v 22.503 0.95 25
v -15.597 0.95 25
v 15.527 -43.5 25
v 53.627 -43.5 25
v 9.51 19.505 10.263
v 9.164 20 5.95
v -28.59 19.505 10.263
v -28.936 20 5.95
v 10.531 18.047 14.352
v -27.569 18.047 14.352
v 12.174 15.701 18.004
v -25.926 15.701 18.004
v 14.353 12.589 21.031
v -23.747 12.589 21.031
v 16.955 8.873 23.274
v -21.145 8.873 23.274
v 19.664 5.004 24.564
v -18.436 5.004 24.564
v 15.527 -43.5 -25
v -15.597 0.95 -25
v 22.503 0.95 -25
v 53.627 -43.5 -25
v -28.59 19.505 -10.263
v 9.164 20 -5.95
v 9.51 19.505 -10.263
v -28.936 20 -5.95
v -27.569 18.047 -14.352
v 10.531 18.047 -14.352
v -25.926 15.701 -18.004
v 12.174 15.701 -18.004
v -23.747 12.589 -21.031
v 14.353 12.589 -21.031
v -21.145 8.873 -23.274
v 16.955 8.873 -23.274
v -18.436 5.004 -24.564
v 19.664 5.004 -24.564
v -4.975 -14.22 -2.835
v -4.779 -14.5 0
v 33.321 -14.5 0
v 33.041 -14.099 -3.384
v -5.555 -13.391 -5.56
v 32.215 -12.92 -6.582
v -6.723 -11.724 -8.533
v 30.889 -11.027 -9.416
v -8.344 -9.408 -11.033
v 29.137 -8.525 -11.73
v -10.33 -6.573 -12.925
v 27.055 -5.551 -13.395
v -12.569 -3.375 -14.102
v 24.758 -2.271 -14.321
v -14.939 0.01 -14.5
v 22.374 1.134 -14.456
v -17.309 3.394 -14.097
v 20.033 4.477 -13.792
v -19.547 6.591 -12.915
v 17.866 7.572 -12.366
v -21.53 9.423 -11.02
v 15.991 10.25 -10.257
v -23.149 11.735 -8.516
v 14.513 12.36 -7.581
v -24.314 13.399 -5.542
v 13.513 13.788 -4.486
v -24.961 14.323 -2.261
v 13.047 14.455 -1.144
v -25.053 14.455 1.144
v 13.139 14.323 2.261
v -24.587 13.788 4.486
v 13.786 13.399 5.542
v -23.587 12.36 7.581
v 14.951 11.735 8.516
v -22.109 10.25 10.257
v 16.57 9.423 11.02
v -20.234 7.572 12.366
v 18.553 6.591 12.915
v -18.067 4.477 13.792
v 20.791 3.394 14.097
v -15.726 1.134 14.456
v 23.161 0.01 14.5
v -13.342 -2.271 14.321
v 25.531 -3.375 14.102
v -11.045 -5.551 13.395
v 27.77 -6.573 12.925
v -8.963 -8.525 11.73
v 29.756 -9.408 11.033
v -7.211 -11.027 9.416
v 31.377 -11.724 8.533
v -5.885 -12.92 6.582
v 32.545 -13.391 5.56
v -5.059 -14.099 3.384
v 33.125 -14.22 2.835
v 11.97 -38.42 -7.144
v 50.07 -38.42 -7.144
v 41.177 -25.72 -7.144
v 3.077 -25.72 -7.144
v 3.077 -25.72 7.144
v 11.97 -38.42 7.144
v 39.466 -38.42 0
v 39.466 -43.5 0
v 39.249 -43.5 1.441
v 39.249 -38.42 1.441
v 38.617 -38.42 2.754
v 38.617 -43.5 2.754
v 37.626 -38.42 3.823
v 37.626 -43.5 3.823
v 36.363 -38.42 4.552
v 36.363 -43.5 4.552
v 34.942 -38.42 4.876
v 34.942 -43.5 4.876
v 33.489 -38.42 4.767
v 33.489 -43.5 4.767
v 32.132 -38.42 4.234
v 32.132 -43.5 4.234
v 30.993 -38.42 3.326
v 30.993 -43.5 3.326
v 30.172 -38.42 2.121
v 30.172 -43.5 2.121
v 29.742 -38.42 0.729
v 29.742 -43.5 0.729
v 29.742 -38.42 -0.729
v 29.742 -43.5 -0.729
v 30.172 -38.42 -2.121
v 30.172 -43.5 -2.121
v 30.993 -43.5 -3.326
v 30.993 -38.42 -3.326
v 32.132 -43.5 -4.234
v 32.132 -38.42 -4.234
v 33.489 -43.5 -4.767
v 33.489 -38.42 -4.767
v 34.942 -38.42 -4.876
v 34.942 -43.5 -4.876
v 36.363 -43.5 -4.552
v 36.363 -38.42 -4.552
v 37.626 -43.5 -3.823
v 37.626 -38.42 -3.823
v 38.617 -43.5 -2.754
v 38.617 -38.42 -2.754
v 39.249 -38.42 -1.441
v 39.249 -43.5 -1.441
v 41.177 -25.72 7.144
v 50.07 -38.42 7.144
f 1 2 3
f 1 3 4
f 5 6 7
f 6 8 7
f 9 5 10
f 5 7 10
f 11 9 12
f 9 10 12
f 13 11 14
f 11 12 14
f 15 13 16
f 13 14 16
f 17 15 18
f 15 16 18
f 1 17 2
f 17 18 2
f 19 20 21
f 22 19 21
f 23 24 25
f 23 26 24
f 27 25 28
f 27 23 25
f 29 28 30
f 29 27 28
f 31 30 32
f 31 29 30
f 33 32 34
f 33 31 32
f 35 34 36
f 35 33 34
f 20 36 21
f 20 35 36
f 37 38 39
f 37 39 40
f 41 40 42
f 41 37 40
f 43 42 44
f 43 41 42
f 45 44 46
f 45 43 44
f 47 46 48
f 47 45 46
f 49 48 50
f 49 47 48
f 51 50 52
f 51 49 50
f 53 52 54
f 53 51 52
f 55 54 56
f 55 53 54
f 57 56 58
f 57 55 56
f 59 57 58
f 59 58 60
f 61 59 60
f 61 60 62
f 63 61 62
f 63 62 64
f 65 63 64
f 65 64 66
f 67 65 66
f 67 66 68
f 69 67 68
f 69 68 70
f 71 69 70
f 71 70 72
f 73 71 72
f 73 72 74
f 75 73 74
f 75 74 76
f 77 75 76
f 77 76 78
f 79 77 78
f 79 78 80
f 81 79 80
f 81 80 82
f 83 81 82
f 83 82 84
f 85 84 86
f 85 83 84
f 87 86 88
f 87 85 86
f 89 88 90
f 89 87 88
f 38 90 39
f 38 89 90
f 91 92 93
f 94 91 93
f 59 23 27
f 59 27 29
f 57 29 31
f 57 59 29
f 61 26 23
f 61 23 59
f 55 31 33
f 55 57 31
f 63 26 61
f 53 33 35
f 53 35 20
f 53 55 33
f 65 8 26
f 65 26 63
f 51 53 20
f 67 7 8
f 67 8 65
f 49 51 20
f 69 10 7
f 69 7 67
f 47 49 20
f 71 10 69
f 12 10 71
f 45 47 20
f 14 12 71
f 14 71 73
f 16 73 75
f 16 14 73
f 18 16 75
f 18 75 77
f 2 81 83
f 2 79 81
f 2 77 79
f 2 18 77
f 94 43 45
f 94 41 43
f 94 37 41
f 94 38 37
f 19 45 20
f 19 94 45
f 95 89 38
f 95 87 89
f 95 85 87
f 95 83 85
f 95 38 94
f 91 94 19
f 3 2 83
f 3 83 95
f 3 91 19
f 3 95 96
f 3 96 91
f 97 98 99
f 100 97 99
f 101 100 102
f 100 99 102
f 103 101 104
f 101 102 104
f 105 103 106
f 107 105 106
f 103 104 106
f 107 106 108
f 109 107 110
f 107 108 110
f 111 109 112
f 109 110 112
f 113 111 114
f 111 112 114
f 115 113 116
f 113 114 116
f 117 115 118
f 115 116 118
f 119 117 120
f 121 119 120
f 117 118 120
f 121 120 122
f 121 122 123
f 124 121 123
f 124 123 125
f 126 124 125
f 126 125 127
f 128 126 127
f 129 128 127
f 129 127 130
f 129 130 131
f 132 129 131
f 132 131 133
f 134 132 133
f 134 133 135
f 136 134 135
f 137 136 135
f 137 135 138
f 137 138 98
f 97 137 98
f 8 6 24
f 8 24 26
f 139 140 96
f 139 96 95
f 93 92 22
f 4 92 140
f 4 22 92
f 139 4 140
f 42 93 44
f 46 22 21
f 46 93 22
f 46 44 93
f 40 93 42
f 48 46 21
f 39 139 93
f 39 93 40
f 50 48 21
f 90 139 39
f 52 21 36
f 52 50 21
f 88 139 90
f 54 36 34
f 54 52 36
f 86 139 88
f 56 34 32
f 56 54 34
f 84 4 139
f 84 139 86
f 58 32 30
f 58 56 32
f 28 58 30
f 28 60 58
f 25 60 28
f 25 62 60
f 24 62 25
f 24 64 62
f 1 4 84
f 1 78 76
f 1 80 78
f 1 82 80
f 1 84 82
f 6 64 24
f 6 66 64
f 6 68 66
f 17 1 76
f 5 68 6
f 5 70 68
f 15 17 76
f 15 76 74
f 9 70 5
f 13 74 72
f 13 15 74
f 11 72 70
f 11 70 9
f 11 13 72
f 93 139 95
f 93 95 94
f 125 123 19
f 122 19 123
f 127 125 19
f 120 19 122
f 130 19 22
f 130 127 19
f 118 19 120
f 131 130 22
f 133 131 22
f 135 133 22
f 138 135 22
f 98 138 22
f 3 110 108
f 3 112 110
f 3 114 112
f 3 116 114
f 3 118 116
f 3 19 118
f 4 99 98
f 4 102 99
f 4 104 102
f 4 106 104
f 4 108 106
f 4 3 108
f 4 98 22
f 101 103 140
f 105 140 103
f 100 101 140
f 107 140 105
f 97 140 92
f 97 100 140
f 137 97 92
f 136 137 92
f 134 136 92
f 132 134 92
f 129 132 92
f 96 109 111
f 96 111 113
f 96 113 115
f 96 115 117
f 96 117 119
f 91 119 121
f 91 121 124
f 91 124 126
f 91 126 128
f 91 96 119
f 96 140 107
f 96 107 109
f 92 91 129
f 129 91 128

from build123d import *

# Parameters (mm, degrees)
BOSS_EXTRUDE1_DEPTH     = 25
FILLET1_R               = 19.05
CUT_EXTRUDE1_DEPTH      = 74.437759365
CUT_EXTRUDE1_DEPTH_BACK = 74.437759365
SKETCH3_R               = 14.5
SKETCH3_W               = 14.2875
SKETCH3_H               = 12.7
SKETCH5_R               = 4.8895
CUT_EXTRUDE2_DEPTH      = 12.7


with BuildPart() as part:
    # Sketch2 → Boss-Extrude1 (new, symmetric)
    with BuildSketch(Plane.XY):
        Polygon((-28.936184536, 20), (15.526994141, -43.5), (53.626994141, -43.5), (9.163815464, 20), align=None)
    extrude(amount=BOSS_EXTRUDE1_DEPTH, both=True)

    # Fillet1
    fillet1_edges = [part.edges().sort_by_distance(p)[0] for p in [
        (-9.886184536, 20, 25),
        (-9.886184536, 20, -25),
    ]]
    fillet(fillet1_edges, radius=FILLET1_R)

    # Sketch3 → Cut-Extrude1 (cut, two sides: drawn at the far end of the back side and taken through both)
    with BuildSketch(Plane(origin=(0, 0, 0), x_dir=(0, 0, -1), z_dir=(1, 0, 0)).offset(-CUT_EXTRUDE1_DEPTH_BACK)):
        with Locations(Location((0, 0, 0), (0, 0, 270))):
            Circle(SKETCH3_R)
        with Locations((0, -32.07)):
            Rectangle(SKETCH3_W, SKETCH3_H)
    extrude(amount=CUT_EXTRUDE1_DEPTH + CUT_EXTRUDE1_DEPTH_BACK, mode=Mode.SUBTRACT)

    # Sketch5 → Cut-Extrude2 (cut)
    with BuildSketch(Plane.XZ.offset(43.5)):
        with Locations((34.576994141, 0)):
            Circle(SKETCH5_R)
    extrude(amount=-CUT_EXTRUDE2_DEPTH, mode=Mode.SUBTRACT)


solid = part.part
